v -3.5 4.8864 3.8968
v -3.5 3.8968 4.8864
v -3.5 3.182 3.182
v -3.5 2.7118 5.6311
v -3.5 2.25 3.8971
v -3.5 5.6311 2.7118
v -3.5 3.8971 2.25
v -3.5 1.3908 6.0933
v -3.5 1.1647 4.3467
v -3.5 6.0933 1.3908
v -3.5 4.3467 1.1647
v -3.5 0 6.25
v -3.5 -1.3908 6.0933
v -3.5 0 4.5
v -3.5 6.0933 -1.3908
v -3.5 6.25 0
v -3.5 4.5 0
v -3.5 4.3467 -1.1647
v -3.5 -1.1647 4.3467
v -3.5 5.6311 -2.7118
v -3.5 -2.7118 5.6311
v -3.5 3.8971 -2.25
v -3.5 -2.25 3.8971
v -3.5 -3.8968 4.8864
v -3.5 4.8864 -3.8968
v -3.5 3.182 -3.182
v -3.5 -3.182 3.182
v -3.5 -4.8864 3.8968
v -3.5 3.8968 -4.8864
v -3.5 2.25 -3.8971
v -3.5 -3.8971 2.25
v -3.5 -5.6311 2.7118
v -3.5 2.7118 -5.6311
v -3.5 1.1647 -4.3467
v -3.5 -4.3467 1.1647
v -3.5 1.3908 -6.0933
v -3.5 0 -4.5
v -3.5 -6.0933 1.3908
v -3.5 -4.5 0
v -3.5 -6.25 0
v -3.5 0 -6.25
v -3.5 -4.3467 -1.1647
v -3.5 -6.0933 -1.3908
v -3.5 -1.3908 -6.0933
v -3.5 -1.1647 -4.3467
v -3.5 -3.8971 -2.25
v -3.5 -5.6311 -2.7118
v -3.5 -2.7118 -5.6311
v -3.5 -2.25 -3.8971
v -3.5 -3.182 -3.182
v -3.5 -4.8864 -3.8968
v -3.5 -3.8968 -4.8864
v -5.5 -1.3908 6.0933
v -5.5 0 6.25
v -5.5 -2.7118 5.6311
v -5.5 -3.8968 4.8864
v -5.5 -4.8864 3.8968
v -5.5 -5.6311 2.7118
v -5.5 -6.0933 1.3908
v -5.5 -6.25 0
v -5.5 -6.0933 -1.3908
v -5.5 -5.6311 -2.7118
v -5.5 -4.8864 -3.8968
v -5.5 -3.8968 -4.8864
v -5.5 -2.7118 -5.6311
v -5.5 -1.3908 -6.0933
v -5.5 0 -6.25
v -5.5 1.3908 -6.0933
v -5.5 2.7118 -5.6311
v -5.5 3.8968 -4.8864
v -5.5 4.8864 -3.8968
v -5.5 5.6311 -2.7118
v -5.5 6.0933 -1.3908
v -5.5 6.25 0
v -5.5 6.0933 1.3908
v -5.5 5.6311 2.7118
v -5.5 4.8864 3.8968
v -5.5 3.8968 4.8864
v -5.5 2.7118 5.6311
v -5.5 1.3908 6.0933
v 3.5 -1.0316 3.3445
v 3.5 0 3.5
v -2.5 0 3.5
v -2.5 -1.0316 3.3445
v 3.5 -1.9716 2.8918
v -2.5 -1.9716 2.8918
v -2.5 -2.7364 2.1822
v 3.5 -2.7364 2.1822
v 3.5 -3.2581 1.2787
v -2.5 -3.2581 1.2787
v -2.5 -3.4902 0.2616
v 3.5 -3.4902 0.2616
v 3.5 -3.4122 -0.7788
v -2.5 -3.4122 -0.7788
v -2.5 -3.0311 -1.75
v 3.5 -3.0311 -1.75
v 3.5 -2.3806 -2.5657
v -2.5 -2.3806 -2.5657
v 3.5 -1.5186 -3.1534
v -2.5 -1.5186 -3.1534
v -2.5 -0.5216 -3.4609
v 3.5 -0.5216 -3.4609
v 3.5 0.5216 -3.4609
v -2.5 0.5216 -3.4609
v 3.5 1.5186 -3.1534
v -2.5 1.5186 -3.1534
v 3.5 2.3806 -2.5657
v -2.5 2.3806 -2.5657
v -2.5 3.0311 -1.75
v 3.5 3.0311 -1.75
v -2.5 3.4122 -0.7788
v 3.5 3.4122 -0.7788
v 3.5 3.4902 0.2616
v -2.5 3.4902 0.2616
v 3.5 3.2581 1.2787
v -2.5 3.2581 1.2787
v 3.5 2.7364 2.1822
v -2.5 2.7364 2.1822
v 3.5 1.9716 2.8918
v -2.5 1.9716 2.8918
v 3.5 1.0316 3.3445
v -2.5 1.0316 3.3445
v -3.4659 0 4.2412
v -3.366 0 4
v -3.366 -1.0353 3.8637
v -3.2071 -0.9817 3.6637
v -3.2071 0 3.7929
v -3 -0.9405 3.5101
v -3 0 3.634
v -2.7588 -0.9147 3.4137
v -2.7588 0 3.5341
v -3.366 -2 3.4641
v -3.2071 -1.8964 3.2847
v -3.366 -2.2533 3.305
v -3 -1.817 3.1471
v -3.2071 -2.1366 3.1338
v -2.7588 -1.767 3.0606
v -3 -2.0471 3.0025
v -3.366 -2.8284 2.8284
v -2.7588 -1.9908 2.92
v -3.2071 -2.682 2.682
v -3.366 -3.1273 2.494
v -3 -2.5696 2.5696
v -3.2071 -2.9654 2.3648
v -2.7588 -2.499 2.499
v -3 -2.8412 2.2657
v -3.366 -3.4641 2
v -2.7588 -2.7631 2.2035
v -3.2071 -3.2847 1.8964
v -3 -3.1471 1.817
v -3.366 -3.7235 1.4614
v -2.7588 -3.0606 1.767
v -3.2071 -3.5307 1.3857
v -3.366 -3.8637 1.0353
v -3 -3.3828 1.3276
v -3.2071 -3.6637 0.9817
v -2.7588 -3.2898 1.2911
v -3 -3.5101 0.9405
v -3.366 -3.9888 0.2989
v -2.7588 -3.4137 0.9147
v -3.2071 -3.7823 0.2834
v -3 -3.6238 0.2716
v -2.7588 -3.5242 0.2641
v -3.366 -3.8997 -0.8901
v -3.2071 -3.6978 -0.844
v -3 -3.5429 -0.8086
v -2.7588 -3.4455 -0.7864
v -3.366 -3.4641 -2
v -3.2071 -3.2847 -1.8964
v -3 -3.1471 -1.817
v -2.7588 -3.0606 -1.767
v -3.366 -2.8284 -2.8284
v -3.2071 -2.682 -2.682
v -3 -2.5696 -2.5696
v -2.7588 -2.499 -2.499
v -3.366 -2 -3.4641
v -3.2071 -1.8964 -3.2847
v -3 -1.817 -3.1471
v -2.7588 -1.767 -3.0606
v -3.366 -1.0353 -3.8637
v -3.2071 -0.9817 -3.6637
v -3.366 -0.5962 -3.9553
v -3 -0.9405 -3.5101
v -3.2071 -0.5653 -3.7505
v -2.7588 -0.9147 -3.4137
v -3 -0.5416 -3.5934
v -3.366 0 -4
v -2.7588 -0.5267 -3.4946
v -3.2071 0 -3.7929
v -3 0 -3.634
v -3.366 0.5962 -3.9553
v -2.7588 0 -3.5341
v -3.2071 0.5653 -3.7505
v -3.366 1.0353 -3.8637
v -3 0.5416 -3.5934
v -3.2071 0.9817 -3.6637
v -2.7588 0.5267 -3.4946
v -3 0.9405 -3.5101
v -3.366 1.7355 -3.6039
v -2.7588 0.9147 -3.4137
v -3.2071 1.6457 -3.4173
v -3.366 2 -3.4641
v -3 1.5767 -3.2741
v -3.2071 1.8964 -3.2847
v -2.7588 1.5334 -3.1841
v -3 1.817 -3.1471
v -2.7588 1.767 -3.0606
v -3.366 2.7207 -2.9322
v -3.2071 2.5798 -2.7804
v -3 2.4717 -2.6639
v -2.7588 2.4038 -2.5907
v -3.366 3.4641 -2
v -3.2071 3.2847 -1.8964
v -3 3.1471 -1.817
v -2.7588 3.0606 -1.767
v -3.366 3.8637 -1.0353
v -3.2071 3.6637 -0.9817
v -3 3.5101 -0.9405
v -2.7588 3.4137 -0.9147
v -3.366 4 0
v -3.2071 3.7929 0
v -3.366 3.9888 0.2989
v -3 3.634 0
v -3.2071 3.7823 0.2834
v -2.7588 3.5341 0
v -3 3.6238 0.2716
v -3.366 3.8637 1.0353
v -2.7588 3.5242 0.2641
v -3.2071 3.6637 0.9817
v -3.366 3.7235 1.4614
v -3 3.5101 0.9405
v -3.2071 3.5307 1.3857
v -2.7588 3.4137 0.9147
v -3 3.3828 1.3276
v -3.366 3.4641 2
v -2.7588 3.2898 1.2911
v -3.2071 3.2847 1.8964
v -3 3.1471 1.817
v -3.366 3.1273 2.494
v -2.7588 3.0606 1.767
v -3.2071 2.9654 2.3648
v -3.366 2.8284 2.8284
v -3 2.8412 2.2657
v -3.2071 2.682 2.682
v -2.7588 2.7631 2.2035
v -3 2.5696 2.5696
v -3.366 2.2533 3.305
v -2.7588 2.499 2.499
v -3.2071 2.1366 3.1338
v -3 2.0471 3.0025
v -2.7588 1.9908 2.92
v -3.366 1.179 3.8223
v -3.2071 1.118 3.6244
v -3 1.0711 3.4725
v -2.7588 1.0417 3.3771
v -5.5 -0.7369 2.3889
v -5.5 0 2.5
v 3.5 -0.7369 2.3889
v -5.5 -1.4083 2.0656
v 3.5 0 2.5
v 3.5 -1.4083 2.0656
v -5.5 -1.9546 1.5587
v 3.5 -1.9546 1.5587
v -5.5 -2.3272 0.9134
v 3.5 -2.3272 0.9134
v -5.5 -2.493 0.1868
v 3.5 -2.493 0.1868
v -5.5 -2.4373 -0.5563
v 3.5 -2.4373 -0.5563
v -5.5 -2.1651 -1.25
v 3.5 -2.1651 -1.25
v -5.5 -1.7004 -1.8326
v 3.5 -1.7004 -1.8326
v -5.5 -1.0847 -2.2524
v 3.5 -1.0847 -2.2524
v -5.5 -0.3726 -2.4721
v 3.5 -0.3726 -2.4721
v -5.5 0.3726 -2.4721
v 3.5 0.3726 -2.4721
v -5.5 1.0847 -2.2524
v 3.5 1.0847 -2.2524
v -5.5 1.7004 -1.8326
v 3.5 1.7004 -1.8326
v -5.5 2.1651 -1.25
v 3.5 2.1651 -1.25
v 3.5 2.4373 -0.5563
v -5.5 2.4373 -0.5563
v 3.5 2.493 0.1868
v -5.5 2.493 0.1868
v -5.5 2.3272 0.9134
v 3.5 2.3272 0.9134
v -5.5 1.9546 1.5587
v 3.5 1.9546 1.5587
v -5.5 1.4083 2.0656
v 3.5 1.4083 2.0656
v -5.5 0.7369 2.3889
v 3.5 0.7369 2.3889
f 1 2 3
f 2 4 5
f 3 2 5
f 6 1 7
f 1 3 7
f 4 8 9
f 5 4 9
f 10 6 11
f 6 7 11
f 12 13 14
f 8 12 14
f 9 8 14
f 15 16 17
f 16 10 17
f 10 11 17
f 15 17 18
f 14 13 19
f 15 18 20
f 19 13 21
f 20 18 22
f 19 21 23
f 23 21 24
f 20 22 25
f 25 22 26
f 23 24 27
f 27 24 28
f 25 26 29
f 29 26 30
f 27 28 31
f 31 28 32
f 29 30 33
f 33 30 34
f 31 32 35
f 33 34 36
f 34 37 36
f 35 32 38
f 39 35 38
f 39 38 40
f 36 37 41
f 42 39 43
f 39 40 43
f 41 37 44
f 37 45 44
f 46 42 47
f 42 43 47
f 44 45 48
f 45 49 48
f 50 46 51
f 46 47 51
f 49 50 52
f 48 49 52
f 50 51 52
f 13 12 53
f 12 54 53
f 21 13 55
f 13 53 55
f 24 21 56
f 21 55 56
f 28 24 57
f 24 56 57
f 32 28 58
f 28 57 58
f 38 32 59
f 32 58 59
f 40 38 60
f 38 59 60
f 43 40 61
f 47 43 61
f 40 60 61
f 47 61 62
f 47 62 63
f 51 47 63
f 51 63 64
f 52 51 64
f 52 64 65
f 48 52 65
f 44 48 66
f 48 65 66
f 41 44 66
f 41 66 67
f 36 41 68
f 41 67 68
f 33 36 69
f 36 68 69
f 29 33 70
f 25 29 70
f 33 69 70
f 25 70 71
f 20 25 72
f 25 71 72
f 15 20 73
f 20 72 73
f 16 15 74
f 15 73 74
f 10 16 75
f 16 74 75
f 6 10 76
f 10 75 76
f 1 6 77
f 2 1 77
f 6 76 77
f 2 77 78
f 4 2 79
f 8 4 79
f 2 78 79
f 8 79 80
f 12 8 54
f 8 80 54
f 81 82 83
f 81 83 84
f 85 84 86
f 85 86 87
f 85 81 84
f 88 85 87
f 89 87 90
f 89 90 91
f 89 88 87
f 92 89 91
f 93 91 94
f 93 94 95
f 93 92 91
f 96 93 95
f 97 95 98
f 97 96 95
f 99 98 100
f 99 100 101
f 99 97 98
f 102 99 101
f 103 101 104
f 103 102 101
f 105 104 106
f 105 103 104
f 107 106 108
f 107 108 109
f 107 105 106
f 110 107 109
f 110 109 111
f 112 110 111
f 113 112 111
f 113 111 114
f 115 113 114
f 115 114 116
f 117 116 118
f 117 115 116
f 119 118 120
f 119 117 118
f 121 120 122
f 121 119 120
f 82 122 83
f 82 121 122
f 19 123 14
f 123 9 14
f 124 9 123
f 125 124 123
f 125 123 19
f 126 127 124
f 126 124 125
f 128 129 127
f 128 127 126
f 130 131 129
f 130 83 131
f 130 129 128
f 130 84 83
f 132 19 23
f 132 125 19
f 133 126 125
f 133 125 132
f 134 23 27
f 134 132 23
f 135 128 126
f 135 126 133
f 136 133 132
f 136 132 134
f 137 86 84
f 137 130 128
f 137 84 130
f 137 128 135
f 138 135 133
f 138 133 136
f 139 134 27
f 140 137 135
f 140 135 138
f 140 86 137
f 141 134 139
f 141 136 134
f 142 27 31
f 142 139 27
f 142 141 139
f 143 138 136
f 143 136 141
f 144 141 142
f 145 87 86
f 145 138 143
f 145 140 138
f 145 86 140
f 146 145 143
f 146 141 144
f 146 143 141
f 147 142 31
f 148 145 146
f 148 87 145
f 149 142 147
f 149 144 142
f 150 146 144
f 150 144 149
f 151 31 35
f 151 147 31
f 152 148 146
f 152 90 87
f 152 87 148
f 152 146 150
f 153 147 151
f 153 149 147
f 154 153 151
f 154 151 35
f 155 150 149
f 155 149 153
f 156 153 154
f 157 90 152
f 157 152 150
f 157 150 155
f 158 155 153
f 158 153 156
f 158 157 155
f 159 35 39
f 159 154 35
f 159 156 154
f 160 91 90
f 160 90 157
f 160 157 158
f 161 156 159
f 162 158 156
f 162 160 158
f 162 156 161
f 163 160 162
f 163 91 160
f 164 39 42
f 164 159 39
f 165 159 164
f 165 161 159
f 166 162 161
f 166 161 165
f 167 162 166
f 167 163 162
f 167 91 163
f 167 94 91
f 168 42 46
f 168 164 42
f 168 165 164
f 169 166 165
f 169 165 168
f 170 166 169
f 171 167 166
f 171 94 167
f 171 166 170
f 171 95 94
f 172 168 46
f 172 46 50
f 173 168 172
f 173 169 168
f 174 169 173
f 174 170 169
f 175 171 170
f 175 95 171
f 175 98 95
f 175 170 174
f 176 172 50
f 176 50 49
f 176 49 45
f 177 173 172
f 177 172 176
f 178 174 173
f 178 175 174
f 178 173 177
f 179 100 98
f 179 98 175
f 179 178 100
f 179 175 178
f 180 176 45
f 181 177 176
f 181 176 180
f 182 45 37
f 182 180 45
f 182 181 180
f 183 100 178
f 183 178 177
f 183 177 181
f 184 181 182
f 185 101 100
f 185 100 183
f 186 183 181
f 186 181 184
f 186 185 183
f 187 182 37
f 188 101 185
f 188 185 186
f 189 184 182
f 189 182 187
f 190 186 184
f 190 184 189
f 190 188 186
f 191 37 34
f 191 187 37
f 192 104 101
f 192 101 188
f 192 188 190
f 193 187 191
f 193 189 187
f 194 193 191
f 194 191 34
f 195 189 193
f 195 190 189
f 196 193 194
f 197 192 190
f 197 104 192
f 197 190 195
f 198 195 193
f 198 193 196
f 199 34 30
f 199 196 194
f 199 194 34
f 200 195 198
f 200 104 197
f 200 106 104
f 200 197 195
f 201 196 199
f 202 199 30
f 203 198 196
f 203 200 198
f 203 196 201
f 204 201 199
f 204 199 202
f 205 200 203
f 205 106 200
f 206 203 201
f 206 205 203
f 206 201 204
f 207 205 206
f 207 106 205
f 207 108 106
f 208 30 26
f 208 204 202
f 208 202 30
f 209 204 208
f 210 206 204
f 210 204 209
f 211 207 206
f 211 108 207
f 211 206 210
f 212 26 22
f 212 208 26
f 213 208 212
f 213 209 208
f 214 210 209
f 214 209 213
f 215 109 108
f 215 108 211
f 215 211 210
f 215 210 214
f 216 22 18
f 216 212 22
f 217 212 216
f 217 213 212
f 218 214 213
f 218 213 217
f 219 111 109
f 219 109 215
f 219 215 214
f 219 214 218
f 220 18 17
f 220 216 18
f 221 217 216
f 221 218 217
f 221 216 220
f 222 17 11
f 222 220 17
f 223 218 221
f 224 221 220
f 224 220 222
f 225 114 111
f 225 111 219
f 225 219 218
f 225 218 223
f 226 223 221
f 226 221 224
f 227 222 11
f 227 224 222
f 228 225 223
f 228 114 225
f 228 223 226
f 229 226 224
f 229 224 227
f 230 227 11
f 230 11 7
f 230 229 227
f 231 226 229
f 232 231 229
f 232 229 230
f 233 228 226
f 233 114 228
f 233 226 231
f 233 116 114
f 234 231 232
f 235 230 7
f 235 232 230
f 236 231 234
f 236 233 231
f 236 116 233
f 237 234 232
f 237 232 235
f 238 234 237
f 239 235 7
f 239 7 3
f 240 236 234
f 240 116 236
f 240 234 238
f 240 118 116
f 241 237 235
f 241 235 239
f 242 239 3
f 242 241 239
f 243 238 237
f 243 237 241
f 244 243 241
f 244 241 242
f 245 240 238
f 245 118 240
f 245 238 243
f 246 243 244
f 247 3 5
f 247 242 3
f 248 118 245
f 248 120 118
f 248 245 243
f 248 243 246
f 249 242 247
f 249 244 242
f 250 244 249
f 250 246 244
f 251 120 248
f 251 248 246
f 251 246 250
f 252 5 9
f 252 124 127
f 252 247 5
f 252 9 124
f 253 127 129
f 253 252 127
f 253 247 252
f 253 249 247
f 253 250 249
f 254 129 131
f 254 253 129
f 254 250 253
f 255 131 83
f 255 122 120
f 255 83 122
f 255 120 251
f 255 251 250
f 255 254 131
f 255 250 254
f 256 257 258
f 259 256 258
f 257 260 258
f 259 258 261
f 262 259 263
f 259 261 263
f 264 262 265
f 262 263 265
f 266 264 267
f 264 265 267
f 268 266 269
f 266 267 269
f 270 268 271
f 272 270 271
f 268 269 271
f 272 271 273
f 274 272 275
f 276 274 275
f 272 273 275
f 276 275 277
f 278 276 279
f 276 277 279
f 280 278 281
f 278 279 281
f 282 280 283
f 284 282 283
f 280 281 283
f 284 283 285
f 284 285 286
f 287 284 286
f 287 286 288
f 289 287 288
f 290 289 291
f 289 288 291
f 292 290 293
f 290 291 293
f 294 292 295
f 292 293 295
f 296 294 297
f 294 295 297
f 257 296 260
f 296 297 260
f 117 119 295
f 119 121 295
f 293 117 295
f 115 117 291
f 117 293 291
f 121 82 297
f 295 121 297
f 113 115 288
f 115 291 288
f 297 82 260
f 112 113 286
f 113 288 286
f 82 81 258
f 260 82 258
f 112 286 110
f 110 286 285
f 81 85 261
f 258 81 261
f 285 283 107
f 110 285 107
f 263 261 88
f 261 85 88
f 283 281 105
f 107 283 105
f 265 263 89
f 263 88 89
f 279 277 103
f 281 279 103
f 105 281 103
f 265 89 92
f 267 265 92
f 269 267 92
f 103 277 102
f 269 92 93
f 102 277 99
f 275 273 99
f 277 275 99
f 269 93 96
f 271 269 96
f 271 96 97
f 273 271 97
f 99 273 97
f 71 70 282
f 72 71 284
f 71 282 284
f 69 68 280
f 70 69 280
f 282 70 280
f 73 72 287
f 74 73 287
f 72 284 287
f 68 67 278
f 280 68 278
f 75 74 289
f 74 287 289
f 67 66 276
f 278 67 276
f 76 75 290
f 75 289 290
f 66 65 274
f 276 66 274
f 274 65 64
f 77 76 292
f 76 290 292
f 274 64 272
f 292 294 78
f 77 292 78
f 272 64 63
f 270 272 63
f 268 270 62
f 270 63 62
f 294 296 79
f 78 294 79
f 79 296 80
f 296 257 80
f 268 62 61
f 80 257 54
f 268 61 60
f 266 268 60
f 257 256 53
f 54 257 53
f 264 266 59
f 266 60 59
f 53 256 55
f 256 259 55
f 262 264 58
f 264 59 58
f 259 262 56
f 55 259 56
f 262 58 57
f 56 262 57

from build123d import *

# Parameters (mm, degrees)
SKETCH1_W = 7
SKETCH1_H = 1
FILLET1_R = 1


with BuildPart() as part:
    # Sketch1 → Revolve1 (revolve)
    with BuildSketch(Plane.XY, mode=Mode.PRIVATE) as revolve1_sk:
        Polygon((-3.5, 2.5), (-3.5, 3.5), (-3.5, 6.25), (-5.5, 6.25), (-5.5, 2.5), align=None)
        with Locations((0, 3)):
            Rectangle(SKETCH1_W, SKETCH1_H)
    revolve(revolve1_sk.sketch.rotate(Axis((0, 0, 0), (1, 0, 0)), 90), axis=Axis((0, 0, 0), (1, 0, 0)))

    # Fillet1
    fillet1_edges = [part.edges().sort_by_distance(p)[0] for p in [
        (-3.5, 0, -3.5),
    ]]
    fillet(fillet1_edges, radius=FILLET1_R)


solid = part.part
